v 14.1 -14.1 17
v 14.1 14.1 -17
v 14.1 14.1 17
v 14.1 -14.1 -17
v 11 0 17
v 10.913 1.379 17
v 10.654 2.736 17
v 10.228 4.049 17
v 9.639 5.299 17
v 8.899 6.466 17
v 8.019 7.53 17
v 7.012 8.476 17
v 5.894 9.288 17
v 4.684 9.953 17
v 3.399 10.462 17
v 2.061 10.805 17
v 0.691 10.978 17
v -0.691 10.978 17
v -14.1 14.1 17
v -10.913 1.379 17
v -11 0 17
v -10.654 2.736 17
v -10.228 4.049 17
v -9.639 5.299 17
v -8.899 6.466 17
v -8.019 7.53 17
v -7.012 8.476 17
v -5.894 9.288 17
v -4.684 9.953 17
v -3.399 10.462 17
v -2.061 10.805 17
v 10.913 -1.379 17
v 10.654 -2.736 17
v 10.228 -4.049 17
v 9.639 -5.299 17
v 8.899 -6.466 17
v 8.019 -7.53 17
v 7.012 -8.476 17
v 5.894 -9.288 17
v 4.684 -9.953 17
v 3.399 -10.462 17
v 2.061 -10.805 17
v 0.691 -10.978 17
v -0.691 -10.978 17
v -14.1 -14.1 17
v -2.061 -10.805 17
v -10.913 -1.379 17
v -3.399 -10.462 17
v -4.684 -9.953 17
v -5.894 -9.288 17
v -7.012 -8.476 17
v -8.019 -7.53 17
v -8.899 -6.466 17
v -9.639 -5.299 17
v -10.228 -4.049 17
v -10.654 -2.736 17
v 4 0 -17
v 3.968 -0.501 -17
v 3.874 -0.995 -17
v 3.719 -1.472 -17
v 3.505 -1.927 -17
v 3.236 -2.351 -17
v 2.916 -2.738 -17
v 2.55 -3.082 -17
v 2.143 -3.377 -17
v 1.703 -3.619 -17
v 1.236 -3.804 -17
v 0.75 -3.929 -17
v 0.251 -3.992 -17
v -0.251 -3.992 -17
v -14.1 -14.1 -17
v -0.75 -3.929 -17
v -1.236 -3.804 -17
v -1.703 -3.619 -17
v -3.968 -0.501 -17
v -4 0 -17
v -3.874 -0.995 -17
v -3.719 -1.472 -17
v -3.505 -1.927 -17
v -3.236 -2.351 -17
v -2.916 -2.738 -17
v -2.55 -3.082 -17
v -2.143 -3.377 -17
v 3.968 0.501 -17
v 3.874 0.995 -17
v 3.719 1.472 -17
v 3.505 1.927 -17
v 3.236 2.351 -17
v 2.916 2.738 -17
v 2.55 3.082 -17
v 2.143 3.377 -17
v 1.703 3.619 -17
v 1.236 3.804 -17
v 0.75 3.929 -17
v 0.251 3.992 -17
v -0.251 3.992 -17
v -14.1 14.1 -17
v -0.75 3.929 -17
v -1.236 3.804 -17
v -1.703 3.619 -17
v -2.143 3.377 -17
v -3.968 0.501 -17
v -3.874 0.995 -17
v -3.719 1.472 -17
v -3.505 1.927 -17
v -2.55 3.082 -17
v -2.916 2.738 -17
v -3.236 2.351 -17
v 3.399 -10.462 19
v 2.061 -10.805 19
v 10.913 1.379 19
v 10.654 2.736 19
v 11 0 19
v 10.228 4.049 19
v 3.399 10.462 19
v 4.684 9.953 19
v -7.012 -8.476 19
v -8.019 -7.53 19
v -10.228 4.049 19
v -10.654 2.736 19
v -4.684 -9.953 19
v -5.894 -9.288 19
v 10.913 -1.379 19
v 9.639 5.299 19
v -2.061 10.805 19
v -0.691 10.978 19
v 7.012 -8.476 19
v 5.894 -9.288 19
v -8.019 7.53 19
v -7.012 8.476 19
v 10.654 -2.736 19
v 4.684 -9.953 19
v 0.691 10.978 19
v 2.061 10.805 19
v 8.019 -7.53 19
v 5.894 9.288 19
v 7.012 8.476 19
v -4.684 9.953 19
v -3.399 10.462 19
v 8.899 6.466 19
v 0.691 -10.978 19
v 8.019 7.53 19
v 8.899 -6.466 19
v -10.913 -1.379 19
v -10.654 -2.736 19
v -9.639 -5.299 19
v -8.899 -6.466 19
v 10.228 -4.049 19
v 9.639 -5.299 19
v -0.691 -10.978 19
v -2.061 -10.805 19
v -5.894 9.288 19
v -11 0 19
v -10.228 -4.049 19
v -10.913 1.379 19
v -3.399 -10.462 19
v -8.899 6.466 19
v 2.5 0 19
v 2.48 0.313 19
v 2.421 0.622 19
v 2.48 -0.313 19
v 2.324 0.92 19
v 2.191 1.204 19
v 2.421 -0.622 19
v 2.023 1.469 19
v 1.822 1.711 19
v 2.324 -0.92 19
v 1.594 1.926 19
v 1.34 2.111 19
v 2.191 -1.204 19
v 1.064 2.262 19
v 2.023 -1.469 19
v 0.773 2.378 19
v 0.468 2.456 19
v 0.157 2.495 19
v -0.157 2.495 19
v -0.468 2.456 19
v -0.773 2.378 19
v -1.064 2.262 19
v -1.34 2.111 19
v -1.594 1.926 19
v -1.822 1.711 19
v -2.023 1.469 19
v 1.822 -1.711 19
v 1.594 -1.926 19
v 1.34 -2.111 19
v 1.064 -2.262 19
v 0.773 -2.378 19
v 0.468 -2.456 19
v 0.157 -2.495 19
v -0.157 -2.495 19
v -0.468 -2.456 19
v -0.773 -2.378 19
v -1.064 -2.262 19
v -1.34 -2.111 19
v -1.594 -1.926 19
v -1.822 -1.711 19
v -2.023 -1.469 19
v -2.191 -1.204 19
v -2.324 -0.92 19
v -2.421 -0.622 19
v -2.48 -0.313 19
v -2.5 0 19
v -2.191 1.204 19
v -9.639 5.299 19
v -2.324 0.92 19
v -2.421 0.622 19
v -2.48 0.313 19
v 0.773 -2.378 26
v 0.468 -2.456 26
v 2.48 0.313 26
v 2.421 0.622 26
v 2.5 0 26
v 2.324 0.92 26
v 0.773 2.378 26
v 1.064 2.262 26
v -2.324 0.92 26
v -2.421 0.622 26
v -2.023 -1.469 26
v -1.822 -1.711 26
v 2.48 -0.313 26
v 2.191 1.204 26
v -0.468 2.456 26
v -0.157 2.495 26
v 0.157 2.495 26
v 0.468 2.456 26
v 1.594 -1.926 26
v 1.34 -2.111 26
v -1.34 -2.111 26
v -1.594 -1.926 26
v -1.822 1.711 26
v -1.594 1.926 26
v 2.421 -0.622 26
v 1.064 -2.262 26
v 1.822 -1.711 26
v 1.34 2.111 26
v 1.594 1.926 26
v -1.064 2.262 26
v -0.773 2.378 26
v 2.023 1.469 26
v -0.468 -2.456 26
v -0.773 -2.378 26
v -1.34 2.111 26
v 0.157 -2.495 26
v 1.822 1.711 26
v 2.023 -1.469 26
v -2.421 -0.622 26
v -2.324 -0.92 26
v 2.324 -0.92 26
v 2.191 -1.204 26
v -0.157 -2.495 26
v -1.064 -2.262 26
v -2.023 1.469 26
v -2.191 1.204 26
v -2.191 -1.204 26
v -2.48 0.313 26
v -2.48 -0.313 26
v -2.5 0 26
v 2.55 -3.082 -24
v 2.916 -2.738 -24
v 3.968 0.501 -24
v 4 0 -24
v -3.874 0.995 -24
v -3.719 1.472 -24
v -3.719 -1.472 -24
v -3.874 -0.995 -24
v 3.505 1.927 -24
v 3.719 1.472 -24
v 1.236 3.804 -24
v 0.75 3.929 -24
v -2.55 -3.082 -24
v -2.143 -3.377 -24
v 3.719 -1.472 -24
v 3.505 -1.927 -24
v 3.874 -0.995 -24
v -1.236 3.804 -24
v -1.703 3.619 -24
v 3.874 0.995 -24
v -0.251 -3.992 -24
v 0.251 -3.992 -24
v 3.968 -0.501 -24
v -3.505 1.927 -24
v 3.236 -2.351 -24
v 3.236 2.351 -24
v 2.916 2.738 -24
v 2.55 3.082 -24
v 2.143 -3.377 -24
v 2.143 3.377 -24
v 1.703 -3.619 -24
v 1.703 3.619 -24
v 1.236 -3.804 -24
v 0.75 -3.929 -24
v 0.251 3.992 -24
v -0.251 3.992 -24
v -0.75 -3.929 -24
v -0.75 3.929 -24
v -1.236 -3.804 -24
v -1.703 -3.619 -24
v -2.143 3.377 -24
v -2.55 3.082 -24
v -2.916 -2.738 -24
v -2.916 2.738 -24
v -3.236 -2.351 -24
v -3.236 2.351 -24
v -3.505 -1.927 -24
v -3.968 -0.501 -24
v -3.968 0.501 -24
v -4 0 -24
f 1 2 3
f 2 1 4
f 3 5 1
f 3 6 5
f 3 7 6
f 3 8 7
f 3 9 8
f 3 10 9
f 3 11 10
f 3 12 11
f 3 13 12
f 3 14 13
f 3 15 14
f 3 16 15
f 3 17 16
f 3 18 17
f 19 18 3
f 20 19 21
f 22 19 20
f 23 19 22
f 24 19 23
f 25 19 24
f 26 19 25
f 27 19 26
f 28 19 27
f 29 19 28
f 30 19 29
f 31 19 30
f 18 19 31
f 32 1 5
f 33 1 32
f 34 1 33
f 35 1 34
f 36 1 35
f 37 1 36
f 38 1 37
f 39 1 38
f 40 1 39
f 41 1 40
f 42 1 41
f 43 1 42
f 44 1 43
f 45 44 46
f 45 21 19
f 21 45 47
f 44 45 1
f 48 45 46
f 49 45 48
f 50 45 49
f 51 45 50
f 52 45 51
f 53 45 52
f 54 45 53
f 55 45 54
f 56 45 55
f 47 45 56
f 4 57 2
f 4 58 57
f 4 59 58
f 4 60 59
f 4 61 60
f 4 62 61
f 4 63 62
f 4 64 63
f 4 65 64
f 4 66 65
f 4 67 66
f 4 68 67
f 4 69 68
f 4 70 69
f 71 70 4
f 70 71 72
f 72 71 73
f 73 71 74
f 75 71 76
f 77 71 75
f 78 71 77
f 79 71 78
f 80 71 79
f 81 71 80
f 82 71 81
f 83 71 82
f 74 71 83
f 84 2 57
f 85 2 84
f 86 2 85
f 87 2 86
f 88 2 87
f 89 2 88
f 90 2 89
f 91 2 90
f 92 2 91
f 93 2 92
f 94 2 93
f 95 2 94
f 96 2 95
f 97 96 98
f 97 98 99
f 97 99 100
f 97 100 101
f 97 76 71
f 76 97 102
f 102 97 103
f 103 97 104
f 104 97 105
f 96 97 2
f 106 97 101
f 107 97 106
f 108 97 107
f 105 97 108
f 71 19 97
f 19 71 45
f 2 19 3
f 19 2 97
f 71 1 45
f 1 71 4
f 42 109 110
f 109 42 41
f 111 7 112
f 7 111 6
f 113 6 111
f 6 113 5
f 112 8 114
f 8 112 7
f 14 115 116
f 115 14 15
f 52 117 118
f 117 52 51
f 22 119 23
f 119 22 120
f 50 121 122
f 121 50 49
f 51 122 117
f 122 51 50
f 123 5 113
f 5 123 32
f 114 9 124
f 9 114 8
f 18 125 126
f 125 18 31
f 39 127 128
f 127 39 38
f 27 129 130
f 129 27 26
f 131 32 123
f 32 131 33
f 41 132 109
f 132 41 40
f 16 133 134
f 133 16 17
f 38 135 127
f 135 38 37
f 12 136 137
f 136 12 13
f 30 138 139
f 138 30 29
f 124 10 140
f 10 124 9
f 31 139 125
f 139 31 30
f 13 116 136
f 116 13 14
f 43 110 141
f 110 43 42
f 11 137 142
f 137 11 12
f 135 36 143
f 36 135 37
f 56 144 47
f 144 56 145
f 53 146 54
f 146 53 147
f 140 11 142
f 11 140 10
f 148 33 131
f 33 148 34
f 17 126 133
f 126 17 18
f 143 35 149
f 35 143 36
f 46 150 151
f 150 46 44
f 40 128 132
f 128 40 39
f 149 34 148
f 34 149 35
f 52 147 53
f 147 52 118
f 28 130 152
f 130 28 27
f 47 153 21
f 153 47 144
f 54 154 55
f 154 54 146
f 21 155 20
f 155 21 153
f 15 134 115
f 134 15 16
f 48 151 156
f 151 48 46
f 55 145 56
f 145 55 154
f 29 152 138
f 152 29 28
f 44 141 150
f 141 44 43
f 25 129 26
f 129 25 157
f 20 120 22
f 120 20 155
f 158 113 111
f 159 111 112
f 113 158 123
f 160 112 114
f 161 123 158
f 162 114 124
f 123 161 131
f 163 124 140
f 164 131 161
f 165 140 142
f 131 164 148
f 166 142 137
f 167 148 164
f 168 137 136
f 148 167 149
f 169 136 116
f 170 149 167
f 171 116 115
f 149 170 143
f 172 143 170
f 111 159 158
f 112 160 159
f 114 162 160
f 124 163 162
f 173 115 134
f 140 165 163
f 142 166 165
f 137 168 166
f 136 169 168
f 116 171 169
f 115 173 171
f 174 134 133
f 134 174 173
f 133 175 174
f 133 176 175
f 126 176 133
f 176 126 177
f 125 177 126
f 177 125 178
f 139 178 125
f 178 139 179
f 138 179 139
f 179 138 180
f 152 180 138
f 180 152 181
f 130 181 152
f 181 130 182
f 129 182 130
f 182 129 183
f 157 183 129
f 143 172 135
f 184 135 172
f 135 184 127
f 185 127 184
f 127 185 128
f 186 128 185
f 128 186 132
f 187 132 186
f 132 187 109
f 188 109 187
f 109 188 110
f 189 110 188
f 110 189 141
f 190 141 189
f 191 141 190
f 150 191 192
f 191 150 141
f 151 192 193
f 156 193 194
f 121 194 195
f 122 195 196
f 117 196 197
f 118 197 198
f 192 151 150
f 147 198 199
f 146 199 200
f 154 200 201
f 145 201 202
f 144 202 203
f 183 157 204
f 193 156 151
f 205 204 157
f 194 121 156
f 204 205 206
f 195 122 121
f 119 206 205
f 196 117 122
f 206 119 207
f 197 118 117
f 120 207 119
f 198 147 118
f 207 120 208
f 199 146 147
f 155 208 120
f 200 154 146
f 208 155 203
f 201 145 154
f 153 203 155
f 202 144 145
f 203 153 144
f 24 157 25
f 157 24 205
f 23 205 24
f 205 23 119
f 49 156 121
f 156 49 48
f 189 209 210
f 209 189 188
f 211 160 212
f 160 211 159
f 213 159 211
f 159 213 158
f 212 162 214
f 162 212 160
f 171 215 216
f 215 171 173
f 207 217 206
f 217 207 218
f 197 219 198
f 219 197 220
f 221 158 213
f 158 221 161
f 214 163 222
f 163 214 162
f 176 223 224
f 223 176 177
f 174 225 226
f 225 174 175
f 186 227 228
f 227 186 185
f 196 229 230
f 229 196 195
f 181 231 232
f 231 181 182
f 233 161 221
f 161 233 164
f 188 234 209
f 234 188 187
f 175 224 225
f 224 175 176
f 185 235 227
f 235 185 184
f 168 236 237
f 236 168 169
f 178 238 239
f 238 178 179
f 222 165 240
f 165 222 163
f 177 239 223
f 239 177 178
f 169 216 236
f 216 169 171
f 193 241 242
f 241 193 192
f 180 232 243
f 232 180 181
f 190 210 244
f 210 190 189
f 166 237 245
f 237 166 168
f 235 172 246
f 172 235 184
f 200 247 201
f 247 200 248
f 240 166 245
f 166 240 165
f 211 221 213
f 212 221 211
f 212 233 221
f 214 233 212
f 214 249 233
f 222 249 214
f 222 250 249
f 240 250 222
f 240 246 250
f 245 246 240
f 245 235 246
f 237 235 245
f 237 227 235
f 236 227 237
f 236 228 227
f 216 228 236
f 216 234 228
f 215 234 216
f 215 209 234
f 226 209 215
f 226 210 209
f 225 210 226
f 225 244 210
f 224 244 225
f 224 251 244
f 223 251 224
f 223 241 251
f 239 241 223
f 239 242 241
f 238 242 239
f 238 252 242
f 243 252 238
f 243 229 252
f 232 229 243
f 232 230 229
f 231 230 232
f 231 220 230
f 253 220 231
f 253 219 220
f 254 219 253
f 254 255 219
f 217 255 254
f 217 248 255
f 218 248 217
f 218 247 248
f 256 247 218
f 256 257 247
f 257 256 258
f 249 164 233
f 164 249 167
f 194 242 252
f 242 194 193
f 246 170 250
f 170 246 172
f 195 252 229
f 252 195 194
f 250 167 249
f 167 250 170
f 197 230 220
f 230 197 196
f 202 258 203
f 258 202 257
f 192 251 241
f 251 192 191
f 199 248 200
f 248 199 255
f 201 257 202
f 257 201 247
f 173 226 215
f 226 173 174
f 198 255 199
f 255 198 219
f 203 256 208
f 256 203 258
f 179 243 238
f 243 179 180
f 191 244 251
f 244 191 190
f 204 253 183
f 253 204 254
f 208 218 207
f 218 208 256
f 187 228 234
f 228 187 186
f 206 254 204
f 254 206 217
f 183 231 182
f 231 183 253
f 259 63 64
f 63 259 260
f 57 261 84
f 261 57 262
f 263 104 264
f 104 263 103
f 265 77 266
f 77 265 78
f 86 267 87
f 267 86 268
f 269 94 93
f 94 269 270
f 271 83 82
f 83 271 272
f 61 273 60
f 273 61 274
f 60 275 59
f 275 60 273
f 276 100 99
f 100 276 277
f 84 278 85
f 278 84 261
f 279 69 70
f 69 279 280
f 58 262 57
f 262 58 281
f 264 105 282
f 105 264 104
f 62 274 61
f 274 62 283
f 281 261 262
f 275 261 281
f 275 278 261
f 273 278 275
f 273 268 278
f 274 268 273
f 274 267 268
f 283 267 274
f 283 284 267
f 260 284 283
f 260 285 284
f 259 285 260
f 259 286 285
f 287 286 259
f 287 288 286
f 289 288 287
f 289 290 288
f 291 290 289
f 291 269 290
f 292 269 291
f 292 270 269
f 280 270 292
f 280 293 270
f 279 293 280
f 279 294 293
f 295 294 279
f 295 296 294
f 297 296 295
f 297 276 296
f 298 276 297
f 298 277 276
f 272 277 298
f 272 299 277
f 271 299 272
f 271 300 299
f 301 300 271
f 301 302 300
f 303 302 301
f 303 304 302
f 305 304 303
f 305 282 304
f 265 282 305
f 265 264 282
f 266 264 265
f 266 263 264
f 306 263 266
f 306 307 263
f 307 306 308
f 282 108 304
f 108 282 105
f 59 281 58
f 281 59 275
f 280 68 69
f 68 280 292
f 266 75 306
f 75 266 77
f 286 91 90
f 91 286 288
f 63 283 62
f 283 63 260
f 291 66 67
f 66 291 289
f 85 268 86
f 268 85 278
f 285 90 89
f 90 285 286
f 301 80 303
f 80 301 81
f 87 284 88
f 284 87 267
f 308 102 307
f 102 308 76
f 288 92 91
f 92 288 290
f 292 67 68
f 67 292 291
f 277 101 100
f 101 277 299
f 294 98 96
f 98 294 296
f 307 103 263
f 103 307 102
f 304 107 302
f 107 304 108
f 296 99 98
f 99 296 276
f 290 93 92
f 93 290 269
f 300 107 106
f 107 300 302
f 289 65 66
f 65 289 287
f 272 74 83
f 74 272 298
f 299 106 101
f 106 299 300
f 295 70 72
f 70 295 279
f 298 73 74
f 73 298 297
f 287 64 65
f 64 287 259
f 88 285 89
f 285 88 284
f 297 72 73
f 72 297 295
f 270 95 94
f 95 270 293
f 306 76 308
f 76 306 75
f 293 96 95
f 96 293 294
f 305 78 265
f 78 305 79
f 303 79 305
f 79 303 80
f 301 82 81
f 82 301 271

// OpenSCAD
/********************************************************
This file is part of the RepRapPNP project, developed at the University of Hamburg.
Author: Daniel Ahlers <2ahlers@informatik.uni-hamburg.de> 
License: 'GNU Affero General Public License AGPLv3 http://www.gnu.org/licenses/agpl.html' 
*******************************************************/

// general object resolution
$fn = 50;

cube([28.2,28.2,34], center=true);
translate([0,0,34/2+2/2]) cylinder(2,r=22/2,center=true);
translate([0,0,34/2+9/2]) cylinder(9,r=5/2,center=true);
translate([0,0,-34/2-7/2]) cylinder(7,r=8/2,center=true);
